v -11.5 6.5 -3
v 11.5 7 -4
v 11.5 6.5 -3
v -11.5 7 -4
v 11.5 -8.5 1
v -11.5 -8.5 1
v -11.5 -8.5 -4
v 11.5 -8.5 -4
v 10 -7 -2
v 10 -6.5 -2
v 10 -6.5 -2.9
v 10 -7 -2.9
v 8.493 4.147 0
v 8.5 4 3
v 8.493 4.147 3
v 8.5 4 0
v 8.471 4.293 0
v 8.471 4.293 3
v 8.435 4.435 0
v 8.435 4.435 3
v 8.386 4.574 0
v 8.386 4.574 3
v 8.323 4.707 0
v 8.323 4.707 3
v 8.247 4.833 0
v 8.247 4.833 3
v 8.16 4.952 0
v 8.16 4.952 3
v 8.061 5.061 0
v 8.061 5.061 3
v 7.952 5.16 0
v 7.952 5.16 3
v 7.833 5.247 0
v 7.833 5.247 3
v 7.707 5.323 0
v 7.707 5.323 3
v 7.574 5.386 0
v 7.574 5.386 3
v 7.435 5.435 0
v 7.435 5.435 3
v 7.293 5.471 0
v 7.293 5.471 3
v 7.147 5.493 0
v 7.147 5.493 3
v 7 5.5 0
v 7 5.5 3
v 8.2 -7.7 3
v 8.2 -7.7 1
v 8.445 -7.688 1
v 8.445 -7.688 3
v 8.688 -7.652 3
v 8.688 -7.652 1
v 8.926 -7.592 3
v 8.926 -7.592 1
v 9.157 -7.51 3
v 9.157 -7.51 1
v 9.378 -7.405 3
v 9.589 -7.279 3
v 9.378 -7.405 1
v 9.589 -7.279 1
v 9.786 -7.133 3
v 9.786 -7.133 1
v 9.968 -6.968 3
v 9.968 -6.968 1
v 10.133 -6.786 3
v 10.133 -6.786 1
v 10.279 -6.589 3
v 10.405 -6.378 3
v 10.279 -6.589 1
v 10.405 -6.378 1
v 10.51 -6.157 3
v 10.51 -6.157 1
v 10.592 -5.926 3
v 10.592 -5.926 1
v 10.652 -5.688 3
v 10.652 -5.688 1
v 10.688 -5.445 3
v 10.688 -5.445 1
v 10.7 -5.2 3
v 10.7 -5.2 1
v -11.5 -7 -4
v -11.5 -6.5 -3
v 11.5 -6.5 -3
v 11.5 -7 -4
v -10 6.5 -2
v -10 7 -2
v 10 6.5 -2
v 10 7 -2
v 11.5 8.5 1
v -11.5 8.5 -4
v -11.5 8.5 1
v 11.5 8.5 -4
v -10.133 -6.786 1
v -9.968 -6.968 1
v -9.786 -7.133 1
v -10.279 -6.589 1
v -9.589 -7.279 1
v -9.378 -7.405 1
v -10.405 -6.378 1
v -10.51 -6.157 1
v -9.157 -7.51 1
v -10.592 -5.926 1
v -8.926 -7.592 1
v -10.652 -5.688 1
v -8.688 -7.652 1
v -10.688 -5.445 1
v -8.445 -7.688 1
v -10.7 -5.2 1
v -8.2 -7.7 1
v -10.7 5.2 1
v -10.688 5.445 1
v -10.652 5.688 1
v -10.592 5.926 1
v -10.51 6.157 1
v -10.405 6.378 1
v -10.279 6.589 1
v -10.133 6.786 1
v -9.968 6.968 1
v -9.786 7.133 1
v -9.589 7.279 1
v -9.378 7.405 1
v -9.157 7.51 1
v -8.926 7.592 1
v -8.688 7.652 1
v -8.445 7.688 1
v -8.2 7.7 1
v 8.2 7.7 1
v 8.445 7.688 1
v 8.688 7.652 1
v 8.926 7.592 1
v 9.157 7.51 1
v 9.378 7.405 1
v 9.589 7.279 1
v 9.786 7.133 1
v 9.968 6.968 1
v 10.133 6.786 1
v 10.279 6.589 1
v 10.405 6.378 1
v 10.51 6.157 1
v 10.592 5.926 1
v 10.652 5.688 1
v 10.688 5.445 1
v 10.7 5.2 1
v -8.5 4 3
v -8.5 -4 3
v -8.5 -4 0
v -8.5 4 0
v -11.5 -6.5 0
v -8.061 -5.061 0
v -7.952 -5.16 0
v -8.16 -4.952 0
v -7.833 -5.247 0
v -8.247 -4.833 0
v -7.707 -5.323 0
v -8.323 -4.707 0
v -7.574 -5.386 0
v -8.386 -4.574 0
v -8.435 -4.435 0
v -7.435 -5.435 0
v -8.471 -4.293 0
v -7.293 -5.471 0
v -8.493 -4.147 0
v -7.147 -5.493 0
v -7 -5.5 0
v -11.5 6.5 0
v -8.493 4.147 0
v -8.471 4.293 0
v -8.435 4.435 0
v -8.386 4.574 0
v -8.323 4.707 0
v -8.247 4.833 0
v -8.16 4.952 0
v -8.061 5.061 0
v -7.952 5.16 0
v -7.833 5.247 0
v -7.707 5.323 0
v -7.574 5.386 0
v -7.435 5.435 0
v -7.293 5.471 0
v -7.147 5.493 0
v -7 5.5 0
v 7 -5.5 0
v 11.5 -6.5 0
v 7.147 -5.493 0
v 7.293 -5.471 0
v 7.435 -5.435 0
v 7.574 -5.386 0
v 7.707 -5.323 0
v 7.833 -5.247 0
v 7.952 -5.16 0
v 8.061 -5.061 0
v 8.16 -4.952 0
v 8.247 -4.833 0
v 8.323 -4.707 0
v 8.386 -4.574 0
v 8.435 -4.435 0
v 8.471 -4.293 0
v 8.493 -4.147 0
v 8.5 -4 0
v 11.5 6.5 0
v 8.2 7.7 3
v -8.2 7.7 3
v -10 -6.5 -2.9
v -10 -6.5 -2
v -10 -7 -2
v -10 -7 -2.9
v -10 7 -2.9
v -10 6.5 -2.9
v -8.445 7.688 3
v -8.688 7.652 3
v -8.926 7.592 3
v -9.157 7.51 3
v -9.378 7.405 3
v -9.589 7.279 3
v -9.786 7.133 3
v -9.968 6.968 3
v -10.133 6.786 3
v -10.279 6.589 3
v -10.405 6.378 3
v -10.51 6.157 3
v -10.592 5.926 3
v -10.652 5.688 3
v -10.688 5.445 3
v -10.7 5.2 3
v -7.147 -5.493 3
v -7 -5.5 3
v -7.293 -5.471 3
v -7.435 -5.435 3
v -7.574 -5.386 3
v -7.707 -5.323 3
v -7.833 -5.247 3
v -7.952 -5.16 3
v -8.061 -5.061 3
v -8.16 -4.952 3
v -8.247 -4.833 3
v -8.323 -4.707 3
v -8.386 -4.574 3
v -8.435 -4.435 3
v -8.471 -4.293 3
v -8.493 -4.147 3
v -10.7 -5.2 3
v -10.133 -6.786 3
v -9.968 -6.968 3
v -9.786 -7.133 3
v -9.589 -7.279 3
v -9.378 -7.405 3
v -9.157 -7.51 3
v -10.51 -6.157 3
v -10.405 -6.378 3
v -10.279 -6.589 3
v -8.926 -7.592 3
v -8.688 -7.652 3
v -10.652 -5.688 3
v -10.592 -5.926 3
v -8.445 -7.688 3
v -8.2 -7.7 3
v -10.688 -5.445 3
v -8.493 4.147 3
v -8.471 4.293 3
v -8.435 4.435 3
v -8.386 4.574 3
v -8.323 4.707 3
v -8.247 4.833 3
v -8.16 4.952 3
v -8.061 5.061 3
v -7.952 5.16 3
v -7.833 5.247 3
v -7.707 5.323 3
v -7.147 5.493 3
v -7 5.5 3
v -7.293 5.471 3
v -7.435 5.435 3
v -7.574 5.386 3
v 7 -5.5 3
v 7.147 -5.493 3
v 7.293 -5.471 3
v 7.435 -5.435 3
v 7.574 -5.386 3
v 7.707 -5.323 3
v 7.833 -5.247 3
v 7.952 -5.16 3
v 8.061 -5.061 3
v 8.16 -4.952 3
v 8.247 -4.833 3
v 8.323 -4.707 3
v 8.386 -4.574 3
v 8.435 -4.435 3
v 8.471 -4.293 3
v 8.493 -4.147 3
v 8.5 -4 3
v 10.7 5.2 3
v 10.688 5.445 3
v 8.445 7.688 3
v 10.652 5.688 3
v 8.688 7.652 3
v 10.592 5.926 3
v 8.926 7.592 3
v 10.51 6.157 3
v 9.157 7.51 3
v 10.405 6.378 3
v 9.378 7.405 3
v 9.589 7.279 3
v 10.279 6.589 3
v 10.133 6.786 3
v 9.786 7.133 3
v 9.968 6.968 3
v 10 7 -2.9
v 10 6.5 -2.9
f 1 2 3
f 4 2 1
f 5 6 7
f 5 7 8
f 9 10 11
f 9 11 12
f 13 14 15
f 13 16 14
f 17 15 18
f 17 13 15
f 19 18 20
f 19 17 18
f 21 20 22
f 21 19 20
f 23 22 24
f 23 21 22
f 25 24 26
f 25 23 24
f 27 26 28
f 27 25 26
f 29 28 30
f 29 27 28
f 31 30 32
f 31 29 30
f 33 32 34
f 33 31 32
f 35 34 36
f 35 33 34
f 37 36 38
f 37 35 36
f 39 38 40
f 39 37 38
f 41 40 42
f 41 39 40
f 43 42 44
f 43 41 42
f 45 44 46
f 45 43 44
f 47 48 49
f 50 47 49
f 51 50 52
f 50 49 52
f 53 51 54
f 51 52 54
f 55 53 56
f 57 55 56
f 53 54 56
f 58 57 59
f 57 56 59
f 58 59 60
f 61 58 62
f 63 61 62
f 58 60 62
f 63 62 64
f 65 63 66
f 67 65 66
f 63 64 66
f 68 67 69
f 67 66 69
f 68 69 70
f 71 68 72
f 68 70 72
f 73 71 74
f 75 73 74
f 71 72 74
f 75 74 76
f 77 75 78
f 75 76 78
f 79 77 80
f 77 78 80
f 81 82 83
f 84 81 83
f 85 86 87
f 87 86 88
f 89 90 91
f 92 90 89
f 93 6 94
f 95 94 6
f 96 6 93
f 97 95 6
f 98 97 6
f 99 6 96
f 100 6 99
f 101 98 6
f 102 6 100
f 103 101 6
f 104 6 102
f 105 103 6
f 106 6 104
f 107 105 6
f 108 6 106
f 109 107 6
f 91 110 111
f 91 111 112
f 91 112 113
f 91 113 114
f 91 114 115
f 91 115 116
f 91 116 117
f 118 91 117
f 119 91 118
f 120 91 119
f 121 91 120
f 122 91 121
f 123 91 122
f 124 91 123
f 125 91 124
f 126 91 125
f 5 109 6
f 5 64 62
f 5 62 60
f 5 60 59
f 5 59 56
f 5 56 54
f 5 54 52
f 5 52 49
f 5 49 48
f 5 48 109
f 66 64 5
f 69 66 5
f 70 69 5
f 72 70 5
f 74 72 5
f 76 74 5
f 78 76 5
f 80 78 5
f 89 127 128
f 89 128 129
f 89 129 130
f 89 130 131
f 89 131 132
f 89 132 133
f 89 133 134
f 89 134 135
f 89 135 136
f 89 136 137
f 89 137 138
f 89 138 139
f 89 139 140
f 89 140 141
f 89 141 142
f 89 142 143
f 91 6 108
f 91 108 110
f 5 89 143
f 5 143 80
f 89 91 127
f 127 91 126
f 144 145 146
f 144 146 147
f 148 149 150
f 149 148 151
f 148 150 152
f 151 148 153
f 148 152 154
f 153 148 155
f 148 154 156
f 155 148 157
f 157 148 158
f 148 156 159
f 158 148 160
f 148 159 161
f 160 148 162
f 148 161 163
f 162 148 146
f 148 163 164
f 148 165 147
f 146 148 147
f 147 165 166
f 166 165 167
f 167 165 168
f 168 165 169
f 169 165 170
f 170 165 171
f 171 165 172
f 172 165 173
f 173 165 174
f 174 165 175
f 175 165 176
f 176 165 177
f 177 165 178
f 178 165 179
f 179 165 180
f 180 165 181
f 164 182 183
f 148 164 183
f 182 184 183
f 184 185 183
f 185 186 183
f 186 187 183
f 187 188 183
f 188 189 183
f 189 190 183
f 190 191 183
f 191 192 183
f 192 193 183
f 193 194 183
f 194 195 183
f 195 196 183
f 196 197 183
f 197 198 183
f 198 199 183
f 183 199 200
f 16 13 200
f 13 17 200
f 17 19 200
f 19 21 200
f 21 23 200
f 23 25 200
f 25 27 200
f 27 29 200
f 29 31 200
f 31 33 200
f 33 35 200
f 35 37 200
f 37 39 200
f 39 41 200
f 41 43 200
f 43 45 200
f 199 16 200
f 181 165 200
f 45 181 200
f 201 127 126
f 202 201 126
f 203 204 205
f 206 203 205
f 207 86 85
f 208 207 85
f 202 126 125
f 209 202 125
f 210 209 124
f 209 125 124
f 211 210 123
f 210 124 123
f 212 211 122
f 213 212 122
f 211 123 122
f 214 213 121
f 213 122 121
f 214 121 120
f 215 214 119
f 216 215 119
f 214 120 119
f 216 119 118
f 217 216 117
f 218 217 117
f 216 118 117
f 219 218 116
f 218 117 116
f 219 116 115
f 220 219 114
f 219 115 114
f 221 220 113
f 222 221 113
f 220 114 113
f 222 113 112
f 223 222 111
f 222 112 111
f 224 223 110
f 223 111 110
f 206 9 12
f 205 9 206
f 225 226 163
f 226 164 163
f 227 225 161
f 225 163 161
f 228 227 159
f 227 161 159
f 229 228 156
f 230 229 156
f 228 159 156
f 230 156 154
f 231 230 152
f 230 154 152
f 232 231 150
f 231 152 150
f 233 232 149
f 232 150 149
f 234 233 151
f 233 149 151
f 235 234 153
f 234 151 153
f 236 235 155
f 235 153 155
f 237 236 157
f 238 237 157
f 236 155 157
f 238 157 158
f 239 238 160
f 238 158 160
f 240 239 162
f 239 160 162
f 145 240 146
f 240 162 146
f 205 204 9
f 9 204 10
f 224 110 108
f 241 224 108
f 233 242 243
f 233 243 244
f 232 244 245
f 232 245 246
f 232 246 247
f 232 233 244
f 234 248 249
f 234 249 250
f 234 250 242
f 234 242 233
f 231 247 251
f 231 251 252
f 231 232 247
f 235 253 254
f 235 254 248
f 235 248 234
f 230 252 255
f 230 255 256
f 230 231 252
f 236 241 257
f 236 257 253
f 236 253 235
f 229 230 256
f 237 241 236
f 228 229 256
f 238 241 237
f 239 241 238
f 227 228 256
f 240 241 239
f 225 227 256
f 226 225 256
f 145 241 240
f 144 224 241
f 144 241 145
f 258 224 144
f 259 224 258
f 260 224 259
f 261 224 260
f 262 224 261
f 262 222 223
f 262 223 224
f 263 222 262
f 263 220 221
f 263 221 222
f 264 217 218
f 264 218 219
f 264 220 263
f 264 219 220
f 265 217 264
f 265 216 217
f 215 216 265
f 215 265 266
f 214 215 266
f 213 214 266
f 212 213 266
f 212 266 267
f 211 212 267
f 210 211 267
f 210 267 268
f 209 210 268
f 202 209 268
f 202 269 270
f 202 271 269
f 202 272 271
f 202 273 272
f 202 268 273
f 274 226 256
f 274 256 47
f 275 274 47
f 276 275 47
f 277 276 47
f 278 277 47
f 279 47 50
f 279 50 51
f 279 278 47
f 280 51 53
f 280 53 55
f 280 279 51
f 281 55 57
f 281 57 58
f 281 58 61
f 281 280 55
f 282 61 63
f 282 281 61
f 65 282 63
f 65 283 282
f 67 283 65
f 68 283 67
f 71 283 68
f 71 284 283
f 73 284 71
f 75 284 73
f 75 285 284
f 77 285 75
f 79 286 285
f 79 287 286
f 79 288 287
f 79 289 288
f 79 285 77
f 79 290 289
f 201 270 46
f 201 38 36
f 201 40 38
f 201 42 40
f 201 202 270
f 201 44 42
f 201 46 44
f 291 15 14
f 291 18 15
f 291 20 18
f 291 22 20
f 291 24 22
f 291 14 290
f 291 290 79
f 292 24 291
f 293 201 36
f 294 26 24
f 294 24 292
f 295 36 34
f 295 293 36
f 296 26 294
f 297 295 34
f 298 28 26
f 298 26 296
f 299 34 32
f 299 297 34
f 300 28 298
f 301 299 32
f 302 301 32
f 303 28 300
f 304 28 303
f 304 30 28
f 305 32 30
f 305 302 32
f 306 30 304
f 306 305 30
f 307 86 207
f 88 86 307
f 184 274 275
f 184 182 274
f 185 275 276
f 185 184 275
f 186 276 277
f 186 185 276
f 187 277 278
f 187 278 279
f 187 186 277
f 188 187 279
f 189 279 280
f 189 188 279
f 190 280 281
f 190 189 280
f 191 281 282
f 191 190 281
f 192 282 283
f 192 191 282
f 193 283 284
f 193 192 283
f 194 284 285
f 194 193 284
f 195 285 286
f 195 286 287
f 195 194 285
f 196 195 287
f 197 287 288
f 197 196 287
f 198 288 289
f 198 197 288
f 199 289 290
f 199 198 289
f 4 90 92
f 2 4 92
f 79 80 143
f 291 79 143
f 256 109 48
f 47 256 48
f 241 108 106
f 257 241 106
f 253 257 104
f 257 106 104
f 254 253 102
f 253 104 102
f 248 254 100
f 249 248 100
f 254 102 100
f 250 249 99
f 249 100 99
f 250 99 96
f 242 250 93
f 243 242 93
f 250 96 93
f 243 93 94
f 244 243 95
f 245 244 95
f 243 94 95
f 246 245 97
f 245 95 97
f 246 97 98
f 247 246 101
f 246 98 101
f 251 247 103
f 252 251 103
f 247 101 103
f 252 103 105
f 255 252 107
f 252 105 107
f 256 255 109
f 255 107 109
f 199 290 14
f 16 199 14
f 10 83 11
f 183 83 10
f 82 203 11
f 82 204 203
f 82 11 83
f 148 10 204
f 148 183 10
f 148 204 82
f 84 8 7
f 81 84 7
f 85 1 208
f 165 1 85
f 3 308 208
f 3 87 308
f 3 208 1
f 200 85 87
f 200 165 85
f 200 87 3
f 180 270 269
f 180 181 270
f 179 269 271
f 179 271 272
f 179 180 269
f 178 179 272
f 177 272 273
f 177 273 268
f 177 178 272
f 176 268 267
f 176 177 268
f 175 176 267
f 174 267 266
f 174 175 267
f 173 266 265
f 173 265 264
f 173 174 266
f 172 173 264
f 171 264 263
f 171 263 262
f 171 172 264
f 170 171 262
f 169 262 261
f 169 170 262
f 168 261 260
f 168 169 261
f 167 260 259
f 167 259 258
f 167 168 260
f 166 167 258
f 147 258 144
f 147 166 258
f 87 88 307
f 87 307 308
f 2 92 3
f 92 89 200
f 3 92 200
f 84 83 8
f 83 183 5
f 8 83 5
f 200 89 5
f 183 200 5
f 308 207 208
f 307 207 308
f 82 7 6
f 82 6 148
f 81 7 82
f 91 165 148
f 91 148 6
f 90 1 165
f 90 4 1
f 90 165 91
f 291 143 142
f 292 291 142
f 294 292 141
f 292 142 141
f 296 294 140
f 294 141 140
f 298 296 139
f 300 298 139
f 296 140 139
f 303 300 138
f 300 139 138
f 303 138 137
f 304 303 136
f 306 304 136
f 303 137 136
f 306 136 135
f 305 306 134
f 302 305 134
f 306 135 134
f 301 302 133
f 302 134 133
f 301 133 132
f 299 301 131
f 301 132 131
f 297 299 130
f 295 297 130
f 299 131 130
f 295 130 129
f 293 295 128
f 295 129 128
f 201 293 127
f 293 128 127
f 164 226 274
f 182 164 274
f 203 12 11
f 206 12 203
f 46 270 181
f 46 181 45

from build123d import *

# Parameters (mm, degrees)
F0_W         = 23
F0_H         = 17
F1_DEPTH     = 1
F2_DEPTH     = 3
F4_DEPTH     = 4
F5_DEPTH     = 2
F6_DEPTH     = 2
F7_W         = 1.5
F7_H         = 2
F8_DEPTH     = 4
F9_W         = 20
F9_H         = 1.1
F10_DEPTH    = 0.5
F11_W        = 20
F11_H        = 1.1
F12_DEPTH    = 0.5
F13_C1_SIZE2 = 1
F13_C1_SIZE  = 0.5
F13_C2_SIZE2 = 0.5
F13_C2_SIZE  = 1
F15_W        = 17
F15_H        = 11
F16_DEPTH    = 25
F17_R        = 1.5


# Not quite as in the source:
# - two fillets or chamfers of one size are made in one step


with BuildPart() as f1:
    # F0 (on Top) → F1 (new body)
    with BuildSketch(Plane.XY):
        Rectangle(F0_W, F0_H)
        with BuildLine():
            Line((-8.2, 7.7), (8.2, 7.7))
            ThreePointArc((8.2, 7.7), (9.967766953, 6.967766953), (10.7, 5.2))
            Line((10.7, 5.2), (10.7, -5.2))
            ThreePointArc((10.7, -5.2), (9.967766953, -6.967766953), (8.2, -7.7))
            Line((8.2, -7.7), (-8.2, -7.7))
            ThreePointArc((-8.2, -7.7), (-9.967766953, -6.967766953), (-10.7, -5.2))
            Line((-10.7, -5.2), (-10.7, 5.2))
            ThreePointArc((-10.7, 5.2), (-9.967766953, 6.967766953), (-8.2, 7.7))
        make_face(mode=Mode.SUBTRACT)
    extrude(amount=F1_DEPTH)

    # F0 (on Top) → F2 (join)
    with BuildSketch(Plane.XY):
        with BuildLine():
            ThreePointArc((10.7, 5.2), (9.967766953, 6.967766953), (8.2, 7.7))
            Line((8.2, 7.7), (-8.2, 7.7))
            ThreePointArc((-8.2, 7.7), (-9.967766953, 6.967766953), (-10.7, 5.2))
            Line((-10.7, 5.2), (-10.7, -5.2))
            ThreePointArc((-10.7, -5.2), (-9.967766953, -6.967766953), (-8.2, -7.7))
            Line((-8.2, -7.7), (8.2, -7.7))
            ThreePointArc((8.2, -7.7), (9.967766953, -6.967766953), (10.7, -5.2))
            Line((10.7, -5.2), (10.7, 5.2))
        make_face()
    extrude(amount=F2_DEPTH)

    # F3 (on face) → F4 (join)
    with BuildSketch(Plane.XY):
        with BuildLine():
            Line((10, -8.5), (10, -7))
            Line((10, -7), (9.9349351573, -7))
            ThreePointArc((9.9349351573, -7), (9.1354143467, -7.5184046239), (8.2, -7.7))
            Line((8.2, -7.7), (-8.2, -7.7))
            ThreePointArc((-8.2, -7.7), (-9.1354143467, -7.5184046239), (-9.9349351573, -7))
            Line((-9.9349351573, -7), (-10, -7))
            Line((-10, -7), (-10, -8.5))
            Line((-10, -8.5), (10, -8.5))
        make_face()
        with BuildLine():
            ThreePointArc((8.2, -7.7), (9.1354143467, -7.5184046239), (9.9349351573, -7))
            Line((9.9349351573, -7), (-9.9349351573, -7))
            ThreePointArc((-9.9349351573, -7), (-9.1354143467, -7.5184046239), (-8.2, -7.7))
            Line((-8.2, -7.7), (8.2, -7.7))
        make_face()
        with BuildLine():
            Line((9.9349351573, 7), (10, 7))
            Line((10, 7), (10, 8.5))
            Line((10, 8.5), (-10, 8.5))
            Line((-10, 8.5), (-10, 7))
            Line((-10, 7), (-9.9349351573, 7))
            ThreePointArc((-9.9349351573, 7), (-9.1354143467, 7.5184046239), (-8.2, 7.7))
            Line((-8.2, 7.7), (8.2, 7.7))
            ThreePointArc((8.2, 7.7), (9.1354143467, 7.5184046239), (9.9349351573, 7))
        make_face()
        with BuildLine():
            Line((-9.9349351573, 7), (9.9349351573, 7))
            ThreePointArc((9.9349351573, 7), (9.1354143467, 7.5184046239), (8.2, 7.7))
            Line((8.2, 7.7), (-8.2, 7.7))
            ThreePointArc((-8.2, 7.7), (-9.1354143467, 7.5184046239), (-9.9349351573, 7))
        make_face()
    extrude(amount=-F4_DEPTH)

    # F3 (on face) → F5 (join)
    with BuildSketch(Plane.XY):
        with BuildLine():
            Line((-9.9349351573, -7), (9.9349351573, -7))
            ThreePointArc((9.9349351573, -7), (9.967766953, -6.967766953), (10, -6.9349351573))
            Line((10, -6.9349351573), (10, -6.5))
            Line((10, -6.5), (-10, -6.5))
            Line((-10, -6.5), (-10, -6.9349351573))
            ThreePointArc((-10, -6.9349351573), (-9.967766953, -6.967766953), (-9.9349351573, -7))
        make_face()
        with BuildLine():
            Line((10, 6.5), (10, 6.9349351573))
            ThreePointArc((10, 6.9349351573), (9.967766953, 6.967766953), (9.9349351573, 7))
            Line((9.9349351573, 7), (-9.9349351573, 7))
            ThreePointArc((-9.9349351573, 7), (-9.967766953, 6.967766953), (-10, 6.9349351573))
            Line((-10, 6.9349351573), (-10, 6.5))
            Line((-10, 6.5), (10, 6.5))
        make_face()
    extrude(amount=-F5_DEPTH)

    # F3 (on face) → F6 (join)
    with BuildSketch(Plane.XY):
        with BuildLine():
            Line((9.9349351573, -7), (10, -7))
            Line((10, -7), (10, -6.9349351573))
            ThreePointArc((10, -6.9349351573), (9.967766953, -6.967766953), (9.9349351573, -7))
        make_face()
        with BuildLine():
            Line((-10, -7), (-9.9349351573, -7))
            ThreePointArc((-9.9349351573, -7), (-9.967766953, -6.967766953), (-10, -6.9349351573))
            Line((-10, -6.9349351573), (-10, -7))
        make_face()
        with BuildLine():
            ThreePointArc((9.9349351573, 7), (9.967766953, 6.967766953), (10, 6.9349351573))
            Line((10, 6.9349351573), (10, 7))
            Line((10, 7), (9.9349351573, 7))
        make_face()
        with BuildLine():
            Line((-10, 7), (-10, 6.9349351573))
            ThreePointArc((-10, 6.9349351573), (-9.967766953, 6.967766953), (-9.9349351573, 7))
            Line((-9.9349351573, 7), (-10, 7))
        make_face()
    extrude(amount=-F6_DEPTH)

    # F7 (on face) → F8 (join)
    with BuildSketch(Plane(origin=(0, 0, 0), x_dir=(1, 0, 0), z_dir=(0, 0, -1))):
        with Locations((10.75, 7.5)):
            Rectangle(F7_W, F7_H)
        with Locations((-10.75, 7.5)):
            Rectangle(F7_W, F7_H)
        with Locations((-10.75, -7.5)):
            Rectangle(F7_W, F7_H)
        with Locations((10.75, -7.5)):
            Rectangle(F7_W, F7_H)
    extrude(amount=F8_DEPTH)

    # F9 (on face) → F10 (join)
    with BuildSketch(Plane(origin=(0, -7, 0), x_dir=(-1, 0, 0), z_dir=(0, 1, 0))):
        with Locations((0, -3.45)):
            Rectangle(F9_W, F9_H)
    extrude(amount=F10_DEPTH)

    # F11 (on face) → F12 (join)
    with BuildSketch(Plane.XZ.offset(-7)):
        with Locations((0, -3.45)):
            Rectangle(F11_W, F11_H)
    extrude(amount=F12_DEPTH)

    # F13: chamfer of 0.5 x 1 on 2 edges, made by hand

    # F13_c1
    f13_c1_edges = [f1.edges().sort_by_distance(p)[0] for p in [
        (0, -6.5, -4),
    ]]
    f13_c1_side = f1.faces().sort_by_distance((0, -6.51, -4))[0]
    chamfer(f13_c1_edges, length=F13_C1_SIZE, length2=F13_C1_SIZE2, reference=f13_c1_side)

    # F13_c2
    f13_c2_edges = [f1.edges().sort_by_distance(p)[0] for p in [
        (0, 6.5, -4),
    ]]
    f13_c2_side = f1.faces().sort_by_distance((0, 6.5, -3.99))[0]
    chamfer(f13_c2_edges, length=F13_C2_SIZE, length2=F13_C2_SIZE2, reference=f13_c2_side)

    # F15 (on face) → F16 (cut)
    with BuildSketch(Plane.XY.offset(3)):
        Rectangle(F15_W, F15_H)
    extrude(amount=-F16_DEPTH, mode=Mode.SUBTRACT)

    # F17
    f17_edges = [f1.edges().sort_by_distance(p)[0] for p in [
        (-8.5, -5.5, 1.5),
        (-8.5, 5.5, 1.5),
        (8.5, 5.5, 1.5),
        (8.5, -5.5, 1.5),
    ]]
    fillet(f17_edges, radius=F17_R)


solid = f1.part
